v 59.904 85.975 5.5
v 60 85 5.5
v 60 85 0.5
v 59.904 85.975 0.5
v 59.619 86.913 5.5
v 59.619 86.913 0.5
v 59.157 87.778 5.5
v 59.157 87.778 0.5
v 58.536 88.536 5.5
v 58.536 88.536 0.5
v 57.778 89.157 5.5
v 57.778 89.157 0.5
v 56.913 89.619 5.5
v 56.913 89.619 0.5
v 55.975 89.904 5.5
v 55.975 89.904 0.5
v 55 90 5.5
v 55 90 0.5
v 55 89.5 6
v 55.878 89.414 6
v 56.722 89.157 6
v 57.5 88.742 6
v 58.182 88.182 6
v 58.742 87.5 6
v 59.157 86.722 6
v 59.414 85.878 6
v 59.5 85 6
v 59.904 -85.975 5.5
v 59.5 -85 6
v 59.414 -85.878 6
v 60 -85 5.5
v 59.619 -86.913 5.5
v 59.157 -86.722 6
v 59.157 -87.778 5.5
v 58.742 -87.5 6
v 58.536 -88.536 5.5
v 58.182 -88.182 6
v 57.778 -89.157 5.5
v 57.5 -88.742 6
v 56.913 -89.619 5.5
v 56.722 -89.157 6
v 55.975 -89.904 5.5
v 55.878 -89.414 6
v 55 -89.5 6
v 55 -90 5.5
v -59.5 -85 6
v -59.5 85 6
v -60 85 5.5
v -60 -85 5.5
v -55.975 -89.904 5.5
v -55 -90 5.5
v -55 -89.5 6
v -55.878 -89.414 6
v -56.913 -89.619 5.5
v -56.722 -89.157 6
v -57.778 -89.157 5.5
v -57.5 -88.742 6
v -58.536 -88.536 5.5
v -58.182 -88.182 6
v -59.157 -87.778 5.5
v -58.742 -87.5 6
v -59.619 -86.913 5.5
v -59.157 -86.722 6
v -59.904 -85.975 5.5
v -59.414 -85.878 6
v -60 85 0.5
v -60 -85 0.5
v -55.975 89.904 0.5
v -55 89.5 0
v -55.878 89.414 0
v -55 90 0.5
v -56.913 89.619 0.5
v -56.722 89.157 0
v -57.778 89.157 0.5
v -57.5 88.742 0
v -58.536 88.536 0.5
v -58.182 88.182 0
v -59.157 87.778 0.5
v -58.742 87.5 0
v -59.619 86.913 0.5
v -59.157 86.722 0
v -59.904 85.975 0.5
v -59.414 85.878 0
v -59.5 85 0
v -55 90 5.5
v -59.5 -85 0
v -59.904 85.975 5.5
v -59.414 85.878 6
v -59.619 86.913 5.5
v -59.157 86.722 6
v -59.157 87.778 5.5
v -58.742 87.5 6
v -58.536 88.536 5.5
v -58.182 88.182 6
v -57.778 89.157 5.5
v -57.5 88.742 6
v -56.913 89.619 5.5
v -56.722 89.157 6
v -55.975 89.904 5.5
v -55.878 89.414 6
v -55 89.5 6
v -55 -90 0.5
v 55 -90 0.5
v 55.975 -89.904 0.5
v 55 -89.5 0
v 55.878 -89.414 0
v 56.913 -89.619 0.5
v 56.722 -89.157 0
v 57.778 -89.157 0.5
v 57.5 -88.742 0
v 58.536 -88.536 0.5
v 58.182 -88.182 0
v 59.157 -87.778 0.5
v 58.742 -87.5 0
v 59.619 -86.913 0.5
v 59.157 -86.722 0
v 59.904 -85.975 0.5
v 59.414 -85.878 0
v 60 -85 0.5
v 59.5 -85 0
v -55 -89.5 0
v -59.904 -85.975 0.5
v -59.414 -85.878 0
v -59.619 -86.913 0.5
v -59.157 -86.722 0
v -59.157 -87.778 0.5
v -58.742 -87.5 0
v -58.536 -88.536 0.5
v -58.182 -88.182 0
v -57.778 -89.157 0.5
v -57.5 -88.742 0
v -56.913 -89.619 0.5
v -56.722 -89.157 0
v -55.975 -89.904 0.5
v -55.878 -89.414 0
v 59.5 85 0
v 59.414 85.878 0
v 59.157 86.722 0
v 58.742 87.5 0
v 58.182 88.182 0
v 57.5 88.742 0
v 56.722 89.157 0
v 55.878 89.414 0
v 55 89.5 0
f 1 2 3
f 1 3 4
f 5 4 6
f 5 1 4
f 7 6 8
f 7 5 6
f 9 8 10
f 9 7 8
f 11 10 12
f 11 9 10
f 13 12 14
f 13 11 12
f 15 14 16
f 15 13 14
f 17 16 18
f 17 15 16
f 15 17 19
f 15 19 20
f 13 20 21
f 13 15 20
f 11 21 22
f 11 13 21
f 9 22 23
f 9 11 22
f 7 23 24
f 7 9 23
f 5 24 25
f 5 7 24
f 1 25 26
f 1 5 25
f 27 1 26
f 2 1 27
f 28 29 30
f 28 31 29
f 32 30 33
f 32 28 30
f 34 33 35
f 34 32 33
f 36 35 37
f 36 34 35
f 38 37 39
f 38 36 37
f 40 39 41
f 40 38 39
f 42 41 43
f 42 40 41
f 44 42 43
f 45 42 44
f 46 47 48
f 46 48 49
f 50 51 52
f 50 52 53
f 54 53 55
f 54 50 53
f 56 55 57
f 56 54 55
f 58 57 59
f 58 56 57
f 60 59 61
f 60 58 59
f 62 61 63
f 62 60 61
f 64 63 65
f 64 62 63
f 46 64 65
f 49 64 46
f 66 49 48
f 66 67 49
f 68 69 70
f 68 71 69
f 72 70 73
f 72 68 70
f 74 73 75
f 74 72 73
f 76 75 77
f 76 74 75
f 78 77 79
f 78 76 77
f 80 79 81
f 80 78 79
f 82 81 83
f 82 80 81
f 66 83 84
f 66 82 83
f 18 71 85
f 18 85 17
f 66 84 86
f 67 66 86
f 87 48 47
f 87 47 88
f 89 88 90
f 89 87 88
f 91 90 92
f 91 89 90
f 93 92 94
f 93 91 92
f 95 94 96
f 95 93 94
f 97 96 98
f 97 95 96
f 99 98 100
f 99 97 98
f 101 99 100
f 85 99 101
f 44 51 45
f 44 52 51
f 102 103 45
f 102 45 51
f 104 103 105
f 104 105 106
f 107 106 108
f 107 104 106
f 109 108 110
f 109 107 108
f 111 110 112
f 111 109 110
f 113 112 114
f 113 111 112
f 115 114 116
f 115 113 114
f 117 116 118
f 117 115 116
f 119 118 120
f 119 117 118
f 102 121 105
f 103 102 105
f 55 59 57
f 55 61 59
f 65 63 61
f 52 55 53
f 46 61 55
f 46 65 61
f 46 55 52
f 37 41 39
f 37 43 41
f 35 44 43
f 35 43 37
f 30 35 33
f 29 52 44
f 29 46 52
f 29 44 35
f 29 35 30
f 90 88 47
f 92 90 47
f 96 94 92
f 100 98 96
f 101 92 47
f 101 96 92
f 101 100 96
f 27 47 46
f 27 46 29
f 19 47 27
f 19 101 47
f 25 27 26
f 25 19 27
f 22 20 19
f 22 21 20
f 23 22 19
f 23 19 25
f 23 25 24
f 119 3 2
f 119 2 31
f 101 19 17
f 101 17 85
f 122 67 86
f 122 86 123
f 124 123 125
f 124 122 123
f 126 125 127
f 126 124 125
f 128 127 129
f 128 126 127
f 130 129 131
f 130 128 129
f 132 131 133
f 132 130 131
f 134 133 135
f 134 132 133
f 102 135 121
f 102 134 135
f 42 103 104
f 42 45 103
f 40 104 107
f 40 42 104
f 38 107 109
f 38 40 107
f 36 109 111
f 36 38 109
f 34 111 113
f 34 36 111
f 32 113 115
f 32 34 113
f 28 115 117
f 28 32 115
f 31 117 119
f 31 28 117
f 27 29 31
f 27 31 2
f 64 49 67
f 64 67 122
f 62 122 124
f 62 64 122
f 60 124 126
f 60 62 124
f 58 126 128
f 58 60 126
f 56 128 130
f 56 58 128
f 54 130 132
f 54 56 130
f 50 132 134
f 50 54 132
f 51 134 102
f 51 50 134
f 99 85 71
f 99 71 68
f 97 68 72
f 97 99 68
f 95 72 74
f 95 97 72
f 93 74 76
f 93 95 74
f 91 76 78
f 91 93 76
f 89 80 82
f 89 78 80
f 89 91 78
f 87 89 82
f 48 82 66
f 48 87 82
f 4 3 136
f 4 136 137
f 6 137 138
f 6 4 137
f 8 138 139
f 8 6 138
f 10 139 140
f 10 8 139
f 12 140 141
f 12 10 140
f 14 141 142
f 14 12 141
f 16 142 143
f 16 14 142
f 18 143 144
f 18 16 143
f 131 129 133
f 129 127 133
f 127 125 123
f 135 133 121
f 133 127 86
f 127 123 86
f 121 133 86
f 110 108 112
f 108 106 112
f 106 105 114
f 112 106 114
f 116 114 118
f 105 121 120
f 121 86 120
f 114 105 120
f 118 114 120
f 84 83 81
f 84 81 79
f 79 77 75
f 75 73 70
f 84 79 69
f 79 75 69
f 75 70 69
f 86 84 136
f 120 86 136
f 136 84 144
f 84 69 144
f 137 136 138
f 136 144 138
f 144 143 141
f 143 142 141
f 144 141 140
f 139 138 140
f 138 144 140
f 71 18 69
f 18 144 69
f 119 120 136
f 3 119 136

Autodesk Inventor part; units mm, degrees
ref_plane "YZ Plane" through (0, 0, 0) normal (1, 0, 0) x (0, 1, 0)
ref_plane "XZ Plane" through (0, 0, 0) normal (0, 1, 0) x (-1, 0, 0)
ref_plane "XY Plane" through (0, 0, 0) normal (0, 0, 1) x (1, 0, 0)
sketch "Sketch1" plane through (0, 0, 0) normal (0, 0, 1) x (1, 0, 0)
  line L0 (-60, 90) -> (60, 90)
  line L1 (60, 90) -> (60, -90)
  line L2 (60, -90) -> (-60, -90)
  line L3 (-60, -90) -> (-60, 90)
  point P0 (0, 0)
  point P1 (60, 0)
  point P2 (0, 90)
  dimension "d0" = 120
  dimension "d1" = 180
extrude "Extrusion1" add sketch "Sketch1" along normal blind 6
fillet "Fillet1" radius 5 4 edges at (-60, 90, 3) (60, 90, 3) (60, -90, 3) (-60, -90, 3)
chamfer "Chamfer2" distance 0.5 angle 45 16 edges at (0, 90, 6) (-58.5355, 88.5355, 6) (-60, 0, 6) (-58.5355, -88.5355, 6) (0, -90, 6) (58.5355, -88.5355, 6) (60, 0, 6) (58.5355, 88.5355, 6) (0, 90, 0) (-58.5355, 88.5355, 0) (-60, 0, 0) (-58.5355, -88.5355, 0) (0, -90, 0) (58.5355, -88.5355, 0) (60, 0, 0) (58.5355, 88.5355, 0)
sketch "Sketch3" plane through (0, 0, 6) normal (0, 0, 1) x (1, 0, 0)
  line L0 (60, 75) -> (62, 75)
  line L1 (62, 75) -> (62, -75)
  line L2 (62, -75) -> (60, -75)
  line L3 (60, -75) -> (60, 75)
  line L4 (60, -85) -> (60, 85) projected
  point P0 (0, 0)
  point P1 (62, 0)
  point P2 (60, 0)
  dimension "d12" = 150
  dimension "d13" = 2
equation "\"d0\" = width"
equation "\"d1\" = hight"
equation "\"hight\" = 180"
equation "\"width\" = 120"
properties part number "tc-bottom-tray" material "ABS Plastic"
